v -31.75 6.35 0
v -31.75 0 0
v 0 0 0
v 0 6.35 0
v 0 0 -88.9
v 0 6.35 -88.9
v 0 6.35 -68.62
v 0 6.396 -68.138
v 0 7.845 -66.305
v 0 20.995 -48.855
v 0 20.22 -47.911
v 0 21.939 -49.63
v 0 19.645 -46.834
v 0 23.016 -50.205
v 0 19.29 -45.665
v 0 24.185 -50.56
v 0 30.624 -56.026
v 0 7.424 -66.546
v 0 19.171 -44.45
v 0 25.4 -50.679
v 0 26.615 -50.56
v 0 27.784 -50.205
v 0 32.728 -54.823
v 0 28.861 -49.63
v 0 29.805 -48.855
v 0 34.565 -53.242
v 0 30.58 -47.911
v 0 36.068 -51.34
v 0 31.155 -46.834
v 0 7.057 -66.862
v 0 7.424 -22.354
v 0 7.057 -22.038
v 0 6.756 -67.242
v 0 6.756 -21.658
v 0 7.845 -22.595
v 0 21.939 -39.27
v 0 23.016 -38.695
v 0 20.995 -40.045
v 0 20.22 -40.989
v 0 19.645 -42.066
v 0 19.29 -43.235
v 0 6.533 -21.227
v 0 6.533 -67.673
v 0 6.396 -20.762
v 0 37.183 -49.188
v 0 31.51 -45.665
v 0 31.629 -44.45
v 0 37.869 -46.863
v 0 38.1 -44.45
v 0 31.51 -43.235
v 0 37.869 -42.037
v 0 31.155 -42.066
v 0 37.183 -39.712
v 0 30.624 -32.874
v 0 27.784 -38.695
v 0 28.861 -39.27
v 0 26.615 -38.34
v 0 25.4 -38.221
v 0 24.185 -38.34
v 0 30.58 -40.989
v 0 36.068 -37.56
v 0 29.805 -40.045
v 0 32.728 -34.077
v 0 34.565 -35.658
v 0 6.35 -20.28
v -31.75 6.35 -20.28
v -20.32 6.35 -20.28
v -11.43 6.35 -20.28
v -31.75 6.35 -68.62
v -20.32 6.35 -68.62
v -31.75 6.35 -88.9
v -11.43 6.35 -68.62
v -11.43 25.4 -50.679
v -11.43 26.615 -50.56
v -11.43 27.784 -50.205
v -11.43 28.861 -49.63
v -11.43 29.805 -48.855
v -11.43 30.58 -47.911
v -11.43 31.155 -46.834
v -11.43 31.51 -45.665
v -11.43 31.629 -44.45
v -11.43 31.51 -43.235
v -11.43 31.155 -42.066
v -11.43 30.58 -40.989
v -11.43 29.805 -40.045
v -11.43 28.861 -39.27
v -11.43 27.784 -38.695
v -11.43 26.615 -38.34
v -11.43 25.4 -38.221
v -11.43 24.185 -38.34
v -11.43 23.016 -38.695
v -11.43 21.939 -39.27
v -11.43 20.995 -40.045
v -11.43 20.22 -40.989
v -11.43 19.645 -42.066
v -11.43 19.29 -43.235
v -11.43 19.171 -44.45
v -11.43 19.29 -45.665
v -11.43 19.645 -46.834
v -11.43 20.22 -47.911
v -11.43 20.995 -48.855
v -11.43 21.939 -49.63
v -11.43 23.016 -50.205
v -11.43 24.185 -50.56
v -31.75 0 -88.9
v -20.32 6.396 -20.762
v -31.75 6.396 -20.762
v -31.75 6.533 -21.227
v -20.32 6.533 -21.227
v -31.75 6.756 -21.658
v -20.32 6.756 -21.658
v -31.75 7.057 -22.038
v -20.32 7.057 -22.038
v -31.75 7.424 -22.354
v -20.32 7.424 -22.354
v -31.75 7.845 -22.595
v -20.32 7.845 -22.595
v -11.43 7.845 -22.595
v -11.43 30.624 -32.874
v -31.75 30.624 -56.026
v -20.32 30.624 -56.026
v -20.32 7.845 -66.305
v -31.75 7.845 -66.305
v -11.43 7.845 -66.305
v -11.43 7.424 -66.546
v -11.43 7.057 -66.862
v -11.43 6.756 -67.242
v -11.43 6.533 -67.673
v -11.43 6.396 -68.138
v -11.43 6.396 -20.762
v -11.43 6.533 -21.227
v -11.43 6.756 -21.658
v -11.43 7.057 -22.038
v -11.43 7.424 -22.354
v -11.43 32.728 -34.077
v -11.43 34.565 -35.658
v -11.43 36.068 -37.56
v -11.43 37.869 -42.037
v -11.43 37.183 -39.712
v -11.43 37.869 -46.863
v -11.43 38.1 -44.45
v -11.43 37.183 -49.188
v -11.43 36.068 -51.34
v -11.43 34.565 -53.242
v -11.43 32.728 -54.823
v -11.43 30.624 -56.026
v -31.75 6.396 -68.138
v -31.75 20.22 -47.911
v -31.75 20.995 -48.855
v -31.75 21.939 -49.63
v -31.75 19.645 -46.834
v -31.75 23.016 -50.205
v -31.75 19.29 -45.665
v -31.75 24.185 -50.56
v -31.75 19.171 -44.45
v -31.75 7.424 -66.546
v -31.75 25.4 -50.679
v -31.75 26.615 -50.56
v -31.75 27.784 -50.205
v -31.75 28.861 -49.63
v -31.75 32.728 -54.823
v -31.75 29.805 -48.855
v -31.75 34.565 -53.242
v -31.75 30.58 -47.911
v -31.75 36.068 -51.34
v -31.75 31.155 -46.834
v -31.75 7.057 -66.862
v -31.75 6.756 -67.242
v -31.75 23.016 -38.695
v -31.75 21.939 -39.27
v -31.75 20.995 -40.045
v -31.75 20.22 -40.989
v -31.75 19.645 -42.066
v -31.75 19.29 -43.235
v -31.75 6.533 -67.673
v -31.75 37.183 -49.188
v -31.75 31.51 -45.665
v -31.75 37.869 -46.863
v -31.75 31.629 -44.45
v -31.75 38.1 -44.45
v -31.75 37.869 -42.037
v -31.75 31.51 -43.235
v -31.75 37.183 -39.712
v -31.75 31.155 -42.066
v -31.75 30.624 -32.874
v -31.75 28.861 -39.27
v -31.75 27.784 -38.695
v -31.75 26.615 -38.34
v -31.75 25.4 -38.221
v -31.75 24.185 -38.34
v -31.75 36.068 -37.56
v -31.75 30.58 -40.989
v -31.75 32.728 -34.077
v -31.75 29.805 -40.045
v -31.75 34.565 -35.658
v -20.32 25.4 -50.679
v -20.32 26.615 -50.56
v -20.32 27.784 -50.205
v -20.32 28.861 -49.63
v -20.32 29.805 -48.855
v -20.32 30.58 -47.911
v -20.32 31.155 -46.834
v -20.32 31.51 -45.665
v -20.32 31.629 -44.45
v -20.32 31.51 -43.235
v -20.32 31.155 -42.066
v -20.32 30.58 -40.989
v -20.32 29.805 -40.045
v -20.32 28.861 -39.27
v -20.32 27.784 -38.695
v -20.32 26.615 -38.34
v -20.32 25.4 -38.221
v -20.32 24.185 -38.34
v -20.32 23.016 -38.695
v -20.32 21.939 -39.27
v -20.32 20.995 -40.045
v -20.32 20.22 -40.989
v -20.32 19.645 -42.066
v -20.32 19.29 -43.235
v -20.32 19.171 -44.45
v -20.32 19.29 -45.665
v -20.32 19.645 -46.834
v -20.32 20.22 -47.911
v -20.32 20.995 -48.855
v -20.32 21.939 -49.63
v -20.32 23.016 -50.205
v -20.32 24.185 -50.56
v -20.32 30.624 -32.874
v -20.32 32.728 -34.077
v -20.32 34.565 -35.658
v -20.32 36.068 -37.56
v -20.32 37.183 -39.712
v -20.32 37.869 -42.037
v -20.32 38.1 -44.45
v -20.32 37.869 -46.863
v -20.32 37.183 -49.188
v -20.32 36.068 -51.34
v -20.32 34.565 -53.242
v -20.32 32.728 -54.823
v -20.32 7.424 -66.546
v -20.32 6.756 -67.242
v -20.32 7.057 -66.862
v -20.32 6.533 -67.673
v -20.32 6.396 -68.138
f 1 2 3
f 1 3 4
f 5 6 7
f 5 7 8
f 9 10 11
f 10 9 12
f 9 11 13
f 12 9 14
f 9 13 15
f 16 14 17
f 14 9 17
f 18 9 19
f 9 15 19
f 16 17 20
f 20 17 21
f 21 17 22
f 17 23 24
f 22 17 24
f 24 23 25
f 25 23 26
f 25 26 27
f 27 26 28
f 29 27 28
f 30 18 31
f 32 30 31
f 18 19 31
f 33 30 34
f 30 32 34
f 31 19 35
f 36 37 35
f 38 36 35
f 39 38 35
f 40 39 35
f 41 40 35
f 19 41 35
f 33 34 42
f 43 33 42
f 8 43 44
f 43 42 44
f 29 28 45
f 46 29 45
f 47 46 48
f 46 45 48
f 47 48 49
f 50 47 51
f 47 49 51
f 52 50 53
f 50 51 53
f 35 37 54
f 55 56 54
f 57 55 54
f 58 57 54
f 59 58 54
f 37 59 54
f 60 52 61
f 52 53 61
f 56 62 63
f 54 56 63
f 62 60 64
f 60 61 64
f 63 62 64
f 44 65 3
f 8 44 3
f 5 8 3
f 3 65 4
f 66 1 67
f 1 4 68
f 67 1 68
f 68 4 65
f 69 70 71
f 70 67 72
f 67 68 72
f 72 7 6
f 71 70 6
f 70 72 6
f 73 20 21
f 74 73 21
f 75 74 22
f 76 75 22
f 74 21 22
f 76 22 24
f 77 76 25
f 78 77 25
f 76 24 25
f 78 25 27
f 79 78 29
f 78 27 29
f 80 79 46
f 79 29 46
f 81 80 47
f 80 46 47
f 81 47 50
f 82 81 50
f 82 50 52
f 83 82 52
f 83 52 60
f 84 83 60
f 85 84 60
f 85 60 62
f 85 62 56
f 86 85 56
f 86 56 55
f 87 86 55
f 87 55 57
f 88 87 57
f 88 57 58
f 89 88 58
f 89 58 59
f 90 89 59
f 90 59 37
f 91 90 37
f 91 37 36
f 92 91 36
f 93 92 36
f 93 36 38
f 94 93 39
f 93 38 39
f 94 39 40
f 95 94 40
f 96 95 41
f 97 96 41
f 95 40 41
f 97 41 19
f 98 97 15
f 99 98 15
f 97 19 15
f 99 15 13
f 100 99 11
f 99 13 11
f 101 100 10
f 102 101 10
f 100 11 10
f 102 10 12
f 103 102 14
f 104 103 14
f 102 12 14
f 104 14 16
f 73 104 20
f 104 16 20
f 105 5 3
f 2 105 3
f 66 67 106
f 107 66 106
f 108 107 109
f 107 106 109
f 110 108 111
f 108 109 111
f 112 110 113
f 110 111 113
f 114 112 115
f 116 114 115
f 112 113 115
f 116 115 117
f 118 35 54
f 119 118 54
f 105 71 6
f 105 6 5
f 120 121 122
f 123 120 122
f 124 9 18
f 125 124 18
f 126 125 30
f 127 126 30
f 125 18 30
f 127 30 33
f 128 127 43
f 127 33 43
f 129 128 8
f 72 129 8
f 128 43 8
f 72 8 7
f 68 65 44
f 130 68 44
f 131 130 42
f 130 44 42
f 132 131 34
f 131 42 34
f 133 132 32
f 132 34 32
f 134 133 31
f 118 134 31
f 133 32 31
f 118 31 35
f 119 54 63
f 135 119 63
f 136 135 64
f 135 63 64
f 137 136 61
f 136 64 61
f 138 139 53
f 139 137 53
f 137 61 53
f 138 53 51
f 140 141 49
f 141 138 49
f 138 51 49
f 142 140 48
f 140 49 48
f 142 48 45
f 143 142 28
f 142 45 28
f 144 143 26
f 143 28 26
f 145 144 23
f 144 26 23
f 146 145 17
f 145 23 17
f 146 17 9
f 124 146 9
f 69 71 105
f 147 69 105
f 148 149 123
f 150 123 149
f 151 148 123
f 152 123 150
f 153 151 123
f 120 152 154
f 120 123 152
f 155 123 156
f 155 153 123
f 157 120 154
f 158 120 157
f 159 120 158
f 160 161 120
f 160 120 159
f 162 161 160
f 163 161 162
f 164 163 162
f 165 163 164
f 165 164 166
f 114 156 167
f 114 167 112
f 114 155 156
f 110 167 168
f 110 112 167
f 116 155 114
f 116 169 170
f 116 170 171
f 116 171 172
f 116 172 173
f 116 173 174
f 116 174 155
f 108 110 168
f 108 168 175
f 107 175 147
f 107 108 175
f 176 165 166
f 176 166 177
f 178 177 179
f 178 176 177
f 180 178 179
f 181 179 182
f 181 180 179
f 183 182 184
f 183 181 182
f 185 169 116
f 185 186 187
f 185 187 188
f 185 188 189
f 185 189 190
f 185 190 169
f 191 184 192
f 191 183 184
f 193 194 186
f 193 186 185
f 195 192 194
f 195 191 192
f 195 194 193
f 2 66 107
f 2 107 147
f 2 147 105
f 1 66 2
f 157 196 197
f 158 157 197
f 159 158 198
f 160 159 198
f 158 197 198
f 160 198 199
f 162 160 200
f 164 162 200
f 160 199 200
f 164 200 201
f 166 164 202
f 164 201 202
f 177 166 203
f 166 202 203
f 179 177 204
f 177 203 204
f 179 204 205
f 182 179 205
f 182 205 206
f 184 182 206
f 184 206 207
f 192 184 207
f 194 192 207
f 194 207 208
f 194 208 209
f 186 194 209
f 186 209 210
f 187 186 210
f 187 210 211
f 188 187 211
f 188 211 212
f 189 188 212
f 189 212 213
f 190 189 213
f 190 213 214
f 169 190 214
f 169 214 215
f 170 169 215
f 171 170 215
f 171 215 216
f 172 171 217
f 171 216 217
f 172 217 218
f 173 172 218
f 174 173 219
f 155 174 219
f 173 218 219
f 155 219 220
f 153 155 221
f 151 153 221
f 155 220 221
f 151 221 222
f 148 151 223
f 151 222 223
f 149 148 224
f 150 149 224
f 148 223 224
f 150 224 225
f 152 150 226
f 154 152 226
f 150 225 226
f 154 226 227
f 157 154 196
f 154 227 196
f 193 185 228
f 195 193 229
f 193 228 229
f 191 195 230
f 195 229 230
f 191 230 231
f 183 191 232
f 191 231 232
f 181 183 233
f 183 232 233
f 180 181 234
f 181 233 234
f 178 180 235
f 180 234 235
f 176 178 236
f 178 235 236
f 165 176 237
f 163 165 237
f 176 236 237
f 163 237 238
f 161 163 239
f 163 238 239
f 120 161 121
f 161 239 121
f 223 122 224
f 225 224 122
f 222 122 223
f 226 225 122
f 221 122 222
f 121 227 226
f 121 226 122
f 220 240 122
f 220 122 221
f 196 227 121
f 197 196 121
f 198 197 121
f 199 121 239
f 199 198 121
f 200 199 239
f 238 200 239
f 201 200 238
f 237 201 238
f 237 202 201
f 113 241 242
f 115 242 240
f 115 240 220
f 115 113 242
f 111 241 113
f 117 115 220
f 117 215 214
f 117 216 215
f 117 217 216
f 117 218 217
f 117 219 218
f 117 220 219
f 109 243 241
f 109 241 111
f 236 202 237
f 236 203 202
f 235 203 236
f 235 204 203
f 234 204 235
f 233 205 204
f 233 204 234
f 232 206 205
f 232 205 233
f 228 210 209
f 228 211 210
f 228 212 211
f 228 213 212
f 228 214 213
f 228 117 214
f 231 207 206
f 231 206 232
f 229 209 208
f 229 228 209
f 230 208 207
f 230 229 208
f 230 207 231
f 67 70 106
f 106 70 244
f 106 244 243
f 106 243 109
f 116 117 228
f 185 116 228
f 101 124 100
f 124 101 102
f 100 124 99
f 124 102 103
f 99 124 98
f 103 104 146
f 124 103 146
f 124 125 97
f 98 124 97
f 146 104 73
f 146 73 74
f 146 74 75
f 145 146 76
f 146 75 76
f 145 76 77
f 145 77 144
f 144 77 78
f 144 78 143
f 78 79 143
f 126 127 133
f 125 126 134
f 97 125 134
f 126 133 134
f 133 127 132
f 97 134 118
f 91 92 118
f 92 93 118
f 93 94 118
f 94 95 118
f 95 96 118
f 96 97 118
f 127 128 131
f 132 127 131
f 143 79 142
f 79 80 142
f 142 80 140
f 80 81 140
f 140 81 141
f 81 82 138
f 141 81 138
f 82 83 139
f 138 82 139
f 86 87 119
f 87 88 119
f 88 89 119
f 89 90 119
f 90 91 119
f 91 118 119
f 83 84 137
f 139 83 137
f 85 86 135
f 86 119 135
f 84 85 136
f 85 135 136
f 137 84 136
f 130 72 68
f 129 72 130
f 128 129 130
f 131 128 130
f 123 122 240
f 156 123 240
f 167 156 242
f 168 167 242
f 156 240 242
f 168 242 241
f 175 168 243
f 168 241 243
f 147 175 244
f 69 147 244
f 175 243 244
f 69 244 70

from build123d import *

# Parameters (mm, degrees)
SKETCH1_R           = 6.22935
BOSS_EXTRUDE1_DEPTH = 31.75
SKETCH2_W           = 8.89
SKETCH2_H           = 31.75
CUT_EXTRUDE1_DEPTH  = 89.9


with BuildPart() as part:
    # Sketch1 → Boss-Extrude1 (new body)
    with BuildSketch(Plane(origin=(0, 0, 0), x_dir=(0, 0, -1), z_dir=(1, 0, 0))):
        with BuildLine():
            Line((22.594948, 7.845241626), (32.874076775, 30.623791868))
            ThreePointArc((32.874076775, 30.623791868), (44.45, 38.1), (56.025923225, 30.623791868))
            Line((56.025923225, 30.623791868), (66.305052, 7.845241626))
            ThreePointArc((66.305052, 7.845241626), (67.242210206, 6.756307629), (68.620236645, 6.35))
            Line((68.620236645, 6.35), (88.9, 6.35))
            Line((88.9, 6.35), (88.9, 0))
            Line((88.9, 0), (0, 0))
            Line((0, 0), (0, 6.35))
            Line((0, 6.35), (20.279763355, 6.35))
            ThreePointArc((20.279763355, 6.35), (21.657789794, 6.756307629), (22.594948, 7.845241626))
        make_face()
        with Locations((44.45, 25.4)):
            Circle(SKETCH1_R, mode=Mode.SUBTRACT)
    extrude(amount=-BOSS_EXTRUDE1_DEPTH)

    # Sketch2 → Cut-Extrude1 (cut, through all)
    with BuildSketch(Plane.XY):
        with Locations((-15.875, 22.225)):
            Rectangle(SKETCH2_W, SKETCH2_H)
    extrude(amount=-CUT_EXTRUDE1_DEPTH, mode=Mode.SUBTRACT)


solid = part.part
